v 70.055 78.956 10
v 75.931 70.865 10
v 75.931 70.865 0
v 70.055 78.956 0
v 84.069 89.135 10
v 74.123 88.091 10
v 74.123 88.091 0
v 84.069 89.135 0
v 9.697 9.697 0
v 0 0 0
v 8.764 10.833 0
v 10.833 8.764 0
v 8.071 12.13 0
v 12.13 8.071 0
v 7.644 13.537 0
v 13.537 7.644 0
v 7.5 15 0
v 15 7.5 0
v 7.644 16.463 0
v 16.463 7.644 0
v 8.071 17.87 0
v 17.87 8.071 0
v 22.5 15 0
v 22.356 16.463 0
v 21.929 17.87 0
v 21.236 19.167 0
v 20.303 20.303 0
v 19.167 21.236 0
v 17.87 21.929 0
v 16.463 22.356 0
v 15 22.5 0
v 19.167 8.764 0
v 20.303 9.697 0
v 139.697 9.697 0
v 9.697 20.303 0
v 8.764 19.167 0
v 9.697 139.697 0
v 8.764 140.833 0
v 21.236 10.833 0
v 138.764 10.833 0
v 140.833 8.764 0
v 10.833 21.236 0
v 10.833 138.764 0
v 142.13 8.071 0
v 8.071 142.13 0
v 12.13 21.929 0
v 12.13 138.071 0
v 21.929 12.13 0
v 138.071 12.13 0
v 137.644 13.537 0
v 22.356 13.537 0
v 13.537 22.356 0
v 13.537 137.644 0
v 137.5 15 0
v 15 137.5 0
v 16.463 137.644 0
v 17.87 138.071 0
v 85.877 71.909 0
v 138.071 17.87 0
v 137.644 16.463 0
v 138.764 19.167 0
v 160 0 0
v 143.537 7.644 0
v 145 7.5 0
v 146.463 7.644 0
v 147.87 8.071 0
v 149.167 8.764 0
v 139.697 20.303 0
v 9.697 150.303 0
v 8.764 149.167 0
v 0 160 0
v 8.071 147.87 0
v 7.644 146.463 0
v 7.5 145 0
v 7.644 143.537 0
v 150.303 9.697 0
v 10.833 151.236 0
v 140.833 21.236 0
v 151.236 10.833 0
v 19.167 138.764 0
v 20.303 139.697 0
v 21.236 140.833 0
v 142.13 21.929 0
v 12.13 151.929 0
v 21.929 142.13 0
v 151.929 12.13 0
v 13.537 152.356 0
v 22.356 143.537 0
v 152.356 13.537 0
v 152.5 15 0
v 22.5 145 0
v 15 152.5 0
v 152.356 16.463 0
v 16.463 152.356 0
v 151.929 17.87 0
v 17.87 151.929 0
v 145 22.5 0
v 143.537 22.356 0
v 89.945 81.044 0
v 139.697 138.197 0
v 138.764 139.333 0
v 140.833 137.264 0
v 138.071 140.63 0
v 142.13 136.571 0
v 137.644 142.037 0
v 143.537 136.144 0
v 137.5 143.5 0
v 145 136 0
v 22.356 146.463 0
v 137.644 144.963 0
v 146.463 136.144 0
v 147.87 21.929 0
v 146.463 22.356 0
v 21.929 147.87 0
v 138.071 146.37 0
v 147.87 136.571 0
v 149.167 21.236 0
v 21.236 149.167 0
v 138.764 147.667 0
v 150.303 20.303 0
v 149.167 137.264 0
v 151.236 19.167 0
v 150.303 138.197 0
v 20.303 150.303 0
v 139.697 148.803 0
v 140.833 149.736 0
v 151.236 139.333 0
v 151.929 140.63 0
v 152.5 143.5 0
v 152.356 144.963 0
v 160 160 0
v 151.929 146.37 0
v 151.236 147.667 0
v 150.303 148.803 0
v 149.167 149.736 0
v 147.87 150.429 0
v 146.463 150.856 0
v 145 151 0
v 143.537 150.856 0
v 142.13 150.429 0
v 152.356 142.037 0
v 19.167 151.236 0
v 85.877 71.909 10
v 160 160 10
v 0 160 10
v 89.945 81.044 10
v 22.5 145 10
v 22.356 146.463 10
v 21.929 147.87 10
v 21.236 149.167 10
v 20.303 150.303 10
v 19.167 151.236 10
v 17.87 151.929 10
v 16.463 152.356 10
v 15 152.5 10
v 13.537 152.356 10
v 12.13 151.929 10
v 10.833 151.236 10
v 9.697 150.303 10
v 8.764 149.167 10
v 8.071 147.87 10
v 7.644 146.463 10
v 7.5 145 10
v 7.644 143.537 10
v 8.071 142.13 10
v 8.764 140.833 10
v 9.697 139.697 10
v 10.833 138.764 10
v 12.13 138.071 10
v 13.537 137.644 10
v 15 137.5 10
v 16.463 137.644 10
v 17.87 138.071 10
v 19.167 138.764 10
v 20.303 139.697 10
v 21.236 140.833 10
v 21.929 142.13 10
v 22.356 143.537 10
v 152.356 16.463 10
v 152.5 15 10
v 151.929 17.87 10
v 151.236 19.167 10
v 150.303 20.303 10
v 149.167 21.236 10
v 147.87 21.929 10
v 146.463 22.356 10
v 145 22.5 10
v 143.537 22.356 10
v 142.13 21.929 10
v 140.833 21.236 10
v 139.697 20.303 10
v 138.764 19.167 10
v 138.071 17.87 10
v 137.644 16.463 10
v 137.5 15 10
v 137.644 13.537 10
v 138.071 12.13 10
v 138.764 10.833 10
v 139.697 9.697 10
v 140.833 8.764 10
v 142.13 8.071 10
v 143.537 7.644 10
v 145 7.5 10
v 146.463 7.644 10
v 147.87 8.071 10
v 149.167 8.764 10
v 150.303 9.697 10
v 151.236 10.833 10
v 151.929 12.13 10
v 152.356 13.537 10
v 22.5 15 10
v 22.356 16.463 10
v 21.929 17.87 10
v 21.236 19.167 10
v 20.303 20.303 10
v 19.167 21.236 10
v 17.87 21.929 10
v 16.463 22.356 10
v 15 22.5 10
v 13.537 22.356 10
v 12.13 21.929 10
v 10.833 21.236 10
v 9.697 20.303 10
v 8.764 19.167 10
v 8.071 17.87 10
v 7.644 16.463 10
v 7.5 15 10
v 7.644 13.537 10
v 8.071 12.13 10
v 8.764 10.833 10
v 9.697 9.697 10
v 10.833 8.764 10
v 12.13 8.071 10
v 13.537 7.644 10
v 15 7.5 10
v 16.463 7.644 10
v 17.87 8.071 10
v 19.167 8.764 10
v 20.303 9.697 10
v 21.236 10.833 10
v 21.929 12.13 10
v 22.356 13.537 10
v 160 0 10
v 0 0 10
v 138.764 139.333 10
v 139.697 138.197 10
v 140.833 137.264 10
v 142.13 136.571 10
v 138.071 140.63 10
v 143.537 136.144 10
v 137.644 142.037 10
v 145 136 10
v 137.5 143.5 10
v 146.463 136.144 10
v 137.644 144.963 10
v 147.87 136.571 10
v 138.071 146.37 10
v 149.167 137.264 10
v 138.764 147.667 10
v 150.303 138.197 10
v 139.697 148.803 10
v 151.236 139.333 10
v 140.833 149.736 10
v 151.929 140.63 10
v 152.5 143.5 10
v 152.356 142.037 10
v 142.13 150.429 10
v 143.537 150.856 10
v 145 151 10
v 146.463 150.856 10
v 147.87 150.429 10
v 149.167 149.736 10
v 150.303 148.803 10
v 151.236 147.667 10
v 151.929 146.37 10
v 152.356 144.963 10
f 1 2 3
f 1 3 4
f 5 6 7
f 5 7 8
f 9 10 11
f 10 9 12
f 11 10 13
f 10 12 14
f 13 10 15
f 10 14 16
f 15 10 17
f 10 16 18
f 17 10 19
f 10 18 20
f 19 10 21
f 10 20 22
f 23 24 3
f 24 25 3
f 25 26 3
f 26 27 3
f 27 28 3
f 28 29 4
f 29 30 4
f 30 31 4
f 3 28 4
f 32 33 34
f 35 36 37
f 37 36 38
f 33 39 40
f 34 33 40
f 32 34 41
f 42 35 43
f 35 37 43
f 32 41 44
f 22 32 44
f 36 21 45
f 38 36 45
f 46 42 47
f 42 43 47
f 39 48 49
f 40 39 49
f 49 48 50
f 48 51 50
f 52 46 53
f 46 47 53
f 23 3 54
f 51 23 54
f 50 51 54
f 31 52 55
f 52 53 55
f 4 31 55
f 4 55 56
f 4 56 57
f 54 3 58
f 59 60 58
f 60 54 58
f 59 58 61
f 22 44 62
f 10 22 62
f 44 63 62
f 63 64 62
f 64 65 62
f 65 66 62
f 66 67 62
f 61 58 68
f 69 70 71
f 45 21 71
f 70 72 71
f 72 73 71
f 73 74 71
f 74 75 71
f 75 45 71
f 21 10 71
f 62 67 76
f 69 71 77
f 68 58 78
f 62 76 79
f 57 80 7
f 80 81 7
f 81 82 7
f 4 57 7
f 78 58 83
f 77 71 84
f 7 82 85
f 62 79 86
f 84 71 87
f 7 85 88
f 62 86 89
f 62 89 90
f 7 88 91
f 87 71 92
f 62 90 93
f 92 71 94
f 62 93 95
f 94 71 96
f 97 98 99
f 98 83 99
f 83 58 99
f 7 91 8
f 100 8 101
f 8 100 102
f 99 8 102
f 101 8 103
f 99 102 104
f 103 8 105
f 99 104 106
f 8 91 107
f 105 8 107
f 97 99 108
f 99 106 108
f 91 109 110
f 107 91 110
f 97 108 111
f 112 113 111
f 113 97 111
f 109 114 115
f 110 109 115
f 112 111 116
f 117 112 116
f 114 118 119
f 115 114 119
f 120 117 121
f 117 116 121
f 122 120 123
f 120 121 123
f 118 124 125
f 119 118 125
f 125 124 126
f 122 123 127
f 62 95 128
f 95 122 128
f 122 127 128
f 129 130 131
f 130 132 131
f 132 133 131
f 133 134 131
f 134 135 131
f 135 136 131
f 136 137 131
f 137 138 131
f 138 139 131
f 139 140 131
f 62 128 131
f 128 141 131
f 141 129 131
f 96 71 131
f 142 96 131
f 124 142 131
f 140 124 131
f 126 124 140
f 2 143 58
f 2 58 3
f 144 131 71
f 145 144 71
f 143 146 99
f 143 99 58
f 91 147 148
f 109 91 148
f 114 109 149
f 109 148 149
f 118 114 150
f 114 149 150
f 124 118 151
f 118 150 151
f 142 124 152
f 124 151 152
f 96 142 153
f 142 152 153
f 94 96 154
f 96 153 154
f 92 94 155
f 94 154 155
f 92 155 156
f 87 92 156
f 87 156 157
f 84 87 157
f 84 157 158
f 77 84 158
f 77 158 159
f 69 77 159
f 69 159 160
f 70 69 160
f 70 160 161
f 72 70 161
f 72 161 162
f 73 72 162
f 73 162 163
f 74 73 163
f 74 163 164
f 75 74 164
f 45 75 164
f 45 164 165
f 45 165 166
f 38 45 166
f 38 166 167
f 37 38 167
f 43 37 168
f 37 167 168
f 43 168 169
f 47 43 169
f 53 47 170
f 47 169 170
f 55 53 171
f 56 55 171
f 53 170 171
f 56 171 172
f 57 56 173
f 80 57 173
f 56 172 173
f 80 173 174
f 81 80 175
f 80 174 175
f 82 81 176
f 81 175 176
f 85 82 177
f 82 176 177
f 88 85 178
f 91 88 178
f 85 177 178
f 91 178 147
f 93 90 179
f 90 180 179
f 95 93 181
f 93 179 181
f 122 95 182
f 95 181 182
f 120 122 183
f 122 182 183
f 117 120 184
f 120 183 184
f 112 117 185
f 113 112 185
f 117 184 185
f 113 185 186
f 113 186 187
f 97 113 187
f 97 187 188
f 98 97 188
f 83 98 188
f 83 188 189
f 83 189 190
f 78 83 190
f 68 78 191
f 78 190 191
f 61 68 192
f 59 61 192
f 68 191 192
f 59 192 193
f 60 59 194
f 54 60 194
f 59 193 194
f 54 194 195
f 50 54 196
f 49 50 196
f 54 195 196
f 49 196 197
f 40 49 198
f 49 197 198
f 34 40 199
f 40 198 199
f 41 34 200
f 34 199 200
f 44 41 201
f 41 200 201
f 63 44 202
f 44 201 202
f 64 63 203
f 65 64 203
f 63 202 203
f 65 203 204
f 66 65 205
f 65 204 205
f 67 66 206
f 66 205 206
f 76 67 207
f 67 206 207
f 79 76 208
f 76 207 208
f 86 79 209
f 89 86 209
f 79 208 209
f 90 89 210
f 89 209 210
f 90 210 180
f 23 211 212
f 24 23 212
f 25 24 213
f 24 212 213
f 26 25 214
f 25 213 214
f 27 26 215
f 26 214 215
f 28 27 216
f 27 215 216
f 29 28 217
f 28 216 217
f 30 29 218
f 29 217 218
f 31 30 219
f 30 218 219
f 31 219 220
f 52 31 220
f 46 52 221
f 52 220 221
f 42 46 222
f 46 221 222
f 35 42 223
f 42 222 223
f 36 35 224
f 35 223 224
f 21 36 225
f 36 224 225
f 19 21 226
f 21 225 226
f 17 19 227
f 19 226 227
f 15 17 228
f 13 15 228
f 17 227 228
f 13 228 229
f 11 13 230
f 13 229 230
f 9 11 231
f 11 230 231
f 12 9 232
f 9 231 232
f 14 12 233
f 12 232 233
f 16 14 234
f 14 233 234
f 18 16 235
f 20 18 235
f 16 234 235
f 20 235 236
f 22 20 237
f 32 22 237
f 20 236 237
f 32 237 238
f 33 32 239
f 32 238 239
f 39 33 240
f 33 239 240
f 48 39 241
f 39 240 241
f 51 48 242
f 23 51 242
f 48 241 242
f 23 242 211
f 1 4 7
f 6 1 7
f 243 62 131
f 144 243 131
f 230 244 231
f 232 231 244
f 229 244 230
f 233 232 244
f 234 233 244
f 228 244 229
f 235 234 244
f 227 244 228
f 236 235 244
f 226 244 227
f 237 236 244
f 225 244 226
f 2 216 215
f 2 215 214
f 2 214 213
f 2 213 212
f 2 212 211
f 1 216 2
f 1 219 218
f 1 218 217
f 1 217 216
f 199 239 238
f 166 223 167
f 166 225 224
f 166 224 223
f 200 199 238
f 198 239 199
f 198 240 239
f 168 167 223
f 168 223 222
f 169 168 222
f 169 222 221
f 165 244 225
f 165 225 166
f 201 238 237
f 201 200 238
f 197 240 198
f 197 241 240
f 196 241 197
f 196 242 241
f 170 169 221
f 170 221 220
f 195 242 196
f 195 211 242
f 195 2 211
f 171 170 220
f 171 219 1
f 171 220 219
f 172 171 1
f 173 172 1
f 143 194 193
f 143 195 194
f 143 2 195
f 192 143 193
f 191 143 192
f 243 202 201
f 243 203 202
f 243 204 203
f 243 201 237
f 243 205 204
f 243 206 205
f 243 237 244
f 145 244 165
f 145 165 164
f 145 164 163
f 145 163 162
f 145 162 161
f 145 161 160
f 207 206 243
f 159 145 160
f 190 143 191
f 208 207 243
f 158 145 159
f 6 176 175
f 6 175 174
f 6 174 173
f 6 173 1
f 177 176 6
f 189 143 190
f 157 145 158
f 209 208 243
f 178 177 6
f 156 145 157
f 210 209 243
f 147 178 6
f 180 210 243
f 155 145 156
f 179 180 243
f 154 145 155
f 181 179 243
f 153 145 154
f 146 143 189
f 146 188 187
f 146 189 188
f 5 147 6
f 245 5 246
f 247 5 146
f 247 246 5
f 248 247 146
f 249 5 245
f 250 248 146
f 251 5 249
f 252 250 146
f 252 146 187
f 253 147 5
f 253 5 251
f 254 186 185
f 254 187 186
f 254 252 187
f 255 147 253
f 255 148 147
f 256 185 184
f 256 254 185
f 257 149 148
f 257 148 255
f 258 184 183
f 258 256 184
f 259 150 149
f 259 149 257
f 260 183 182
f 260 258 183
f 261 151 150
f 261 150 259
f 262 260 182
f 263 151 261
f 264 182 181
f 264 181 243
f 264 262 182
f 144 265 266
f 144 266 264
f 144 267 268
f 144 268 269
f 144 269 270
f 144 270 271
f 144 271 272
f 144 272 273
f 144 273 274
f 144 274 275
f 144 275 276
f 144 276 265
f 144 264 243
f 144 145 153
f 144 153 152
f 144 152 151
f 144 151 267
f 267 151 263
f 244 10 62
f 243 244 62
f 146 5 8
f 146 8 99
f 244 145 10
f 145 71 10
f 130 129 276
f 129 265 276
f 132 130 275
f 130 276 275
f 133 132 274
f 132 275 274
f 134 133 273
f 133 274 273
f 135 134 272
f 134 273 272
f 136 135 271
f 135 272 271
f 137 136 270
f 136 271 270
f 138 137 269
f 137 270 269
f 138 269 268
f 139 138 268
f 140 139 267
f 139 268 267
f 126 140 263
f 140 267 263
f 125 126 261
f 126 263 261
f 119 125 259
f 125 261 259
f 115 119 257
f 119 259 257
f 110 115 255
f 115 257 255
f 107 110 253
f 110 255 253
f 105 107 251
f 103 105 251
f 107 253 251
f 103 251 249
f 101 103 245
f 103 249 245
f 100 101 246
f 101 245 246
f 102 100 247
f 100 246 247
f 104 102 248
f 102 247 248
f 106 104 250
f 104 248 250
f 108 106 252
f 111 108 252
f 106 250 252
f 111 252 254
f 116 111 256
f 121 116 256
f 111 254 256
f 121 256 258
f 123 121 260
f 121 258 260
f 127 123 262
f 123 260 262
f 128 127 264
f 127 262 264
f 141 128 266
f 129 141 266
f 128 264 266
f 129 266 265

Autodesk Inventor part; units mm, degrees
ref_plane "YZ Plane" through (0, 0, 0) normal (1, 0, 0) x (0, 1, 0)
ref_plane "XZ Plane" through (0, 0, 0) normal (0, 1, 0) x (-1, 0, 0)
ref_plane "XY Plane" through (0, 0, 0) normal (0, 0, 1) x (1, 0, 0)
sketch "Sketch1" plane through (0, 0, 0) normal (0, 0, 1) x (1, 0, 0)
  line L0 (0, 0) -> (160, 0)
  line L1 (160, 0) -> (160, 160)
  line L2 (160, 160) -> (0, 160)
  line L3 (0, 160) -> (0, 0)
  dimension "d0" = 160
  dimension "d1" = 160
extrude "Extrusion1" add sketch "Sketch1" along normal blind 10
sketch "Sketch2" plane through (0, 0, 10) normal (0, 0, 1) x (1, 0, 0)
  line L0 (0, 0) -> (160, 0) projected
  line L1 (0, 0) -> (15, 0)
  line L2 (15, 0) -> (15, 15)
  line L3 (160, 160) -> (0, 160) projected
  line L4 (0, 160) -> (15, 160)
  line L5 (15, 160) -> (15, 145)
  line L6 (160, 0) -> (160, 160) projected
  line L7 (160, 160) -> (145, 160)
  line L8 (145, 160) -> (145, 143.5)
  line L9 (160, 0) -> (160, 15)
  line L10 (160, 15) -> (145, 15)
  circle A0 centre (15, 145) radius 7.5
  circle A1 centre (145, 143.5) radius 7.5
  circle A2 centre (145, 15) radius 7.5
  circle A3 centre (15, 15) radius 7.5
  dimension "d4" = 15
  dimension "d5" = 15
  dimension "d6" = 15
  dimension "d7" = 15
  dimension "d8" = 15
  dimension "d9" = 16.5
  dimension "d10" = 15
  dimension "d11" = 15
  dimension "d12" = 15
  dimension "d13" = 15
  dimension "d14" = 15
  dimension "d15" = 15
extrude "Extrusion2" cut sketch "Sketch2" against normal blind 10
sketch "Sketch3" plane through (0, 0, 10) normal (0, 0, 1) x (1, 0, 0)
  line L0 (0, 160) -> (0, 0) projected
  line L1 (0, 0) -> (80, 0)
  line L2 (0, 0) -> (160, 0) projected
  line L3 (80, 0) -> (0, 0)
  line L4 (0, 0) -> (80, 0)
  dimension "d18" = 80
  dimension "d19" = 80
  dimension "d20" = 80
sketch "Sketch4" plane through (0, 0, 10) normal (0, 0, 1) x (1, 0, 0)
  line L0 (0, 0) -> (160, 0) projected
  line L1 (0, 0) -> (0, 80)
  line L2 (0, 160) -> (0, 0) projected
  dimension "d21" = 80
sketch "Sketch5" plane through (0, 0, 10) normal (0, 0, 1) x (1, 0, 0)
  line L0 (0, 160) -> (0, 0) projected
  line L1 (0, 80) -> (80, 80)
  line L2 (84.0688, 89.1348) -> (89.9454, 81.0437)
  line L3 (89.9454, 81.0437) -> (85.8766, 71.9089)
  line L4 (85.8766, 71.9089) -> (75.9312, 70.8652)
  line L5 (75.9312, 70.8652) -> (70.0546, 78.9563)
  line L6 (70.0546, 78.9563) -> (74.1234, 88.0911)
  line L7 (74.1234, 88.0911) -> (84.0688, 89.1348)
  dimension "d22" = 80
  dimension "d23" = 10
extrude "Extrusion3" cut sketch "Sketch5" against normal blind 10
properties part number "103"
